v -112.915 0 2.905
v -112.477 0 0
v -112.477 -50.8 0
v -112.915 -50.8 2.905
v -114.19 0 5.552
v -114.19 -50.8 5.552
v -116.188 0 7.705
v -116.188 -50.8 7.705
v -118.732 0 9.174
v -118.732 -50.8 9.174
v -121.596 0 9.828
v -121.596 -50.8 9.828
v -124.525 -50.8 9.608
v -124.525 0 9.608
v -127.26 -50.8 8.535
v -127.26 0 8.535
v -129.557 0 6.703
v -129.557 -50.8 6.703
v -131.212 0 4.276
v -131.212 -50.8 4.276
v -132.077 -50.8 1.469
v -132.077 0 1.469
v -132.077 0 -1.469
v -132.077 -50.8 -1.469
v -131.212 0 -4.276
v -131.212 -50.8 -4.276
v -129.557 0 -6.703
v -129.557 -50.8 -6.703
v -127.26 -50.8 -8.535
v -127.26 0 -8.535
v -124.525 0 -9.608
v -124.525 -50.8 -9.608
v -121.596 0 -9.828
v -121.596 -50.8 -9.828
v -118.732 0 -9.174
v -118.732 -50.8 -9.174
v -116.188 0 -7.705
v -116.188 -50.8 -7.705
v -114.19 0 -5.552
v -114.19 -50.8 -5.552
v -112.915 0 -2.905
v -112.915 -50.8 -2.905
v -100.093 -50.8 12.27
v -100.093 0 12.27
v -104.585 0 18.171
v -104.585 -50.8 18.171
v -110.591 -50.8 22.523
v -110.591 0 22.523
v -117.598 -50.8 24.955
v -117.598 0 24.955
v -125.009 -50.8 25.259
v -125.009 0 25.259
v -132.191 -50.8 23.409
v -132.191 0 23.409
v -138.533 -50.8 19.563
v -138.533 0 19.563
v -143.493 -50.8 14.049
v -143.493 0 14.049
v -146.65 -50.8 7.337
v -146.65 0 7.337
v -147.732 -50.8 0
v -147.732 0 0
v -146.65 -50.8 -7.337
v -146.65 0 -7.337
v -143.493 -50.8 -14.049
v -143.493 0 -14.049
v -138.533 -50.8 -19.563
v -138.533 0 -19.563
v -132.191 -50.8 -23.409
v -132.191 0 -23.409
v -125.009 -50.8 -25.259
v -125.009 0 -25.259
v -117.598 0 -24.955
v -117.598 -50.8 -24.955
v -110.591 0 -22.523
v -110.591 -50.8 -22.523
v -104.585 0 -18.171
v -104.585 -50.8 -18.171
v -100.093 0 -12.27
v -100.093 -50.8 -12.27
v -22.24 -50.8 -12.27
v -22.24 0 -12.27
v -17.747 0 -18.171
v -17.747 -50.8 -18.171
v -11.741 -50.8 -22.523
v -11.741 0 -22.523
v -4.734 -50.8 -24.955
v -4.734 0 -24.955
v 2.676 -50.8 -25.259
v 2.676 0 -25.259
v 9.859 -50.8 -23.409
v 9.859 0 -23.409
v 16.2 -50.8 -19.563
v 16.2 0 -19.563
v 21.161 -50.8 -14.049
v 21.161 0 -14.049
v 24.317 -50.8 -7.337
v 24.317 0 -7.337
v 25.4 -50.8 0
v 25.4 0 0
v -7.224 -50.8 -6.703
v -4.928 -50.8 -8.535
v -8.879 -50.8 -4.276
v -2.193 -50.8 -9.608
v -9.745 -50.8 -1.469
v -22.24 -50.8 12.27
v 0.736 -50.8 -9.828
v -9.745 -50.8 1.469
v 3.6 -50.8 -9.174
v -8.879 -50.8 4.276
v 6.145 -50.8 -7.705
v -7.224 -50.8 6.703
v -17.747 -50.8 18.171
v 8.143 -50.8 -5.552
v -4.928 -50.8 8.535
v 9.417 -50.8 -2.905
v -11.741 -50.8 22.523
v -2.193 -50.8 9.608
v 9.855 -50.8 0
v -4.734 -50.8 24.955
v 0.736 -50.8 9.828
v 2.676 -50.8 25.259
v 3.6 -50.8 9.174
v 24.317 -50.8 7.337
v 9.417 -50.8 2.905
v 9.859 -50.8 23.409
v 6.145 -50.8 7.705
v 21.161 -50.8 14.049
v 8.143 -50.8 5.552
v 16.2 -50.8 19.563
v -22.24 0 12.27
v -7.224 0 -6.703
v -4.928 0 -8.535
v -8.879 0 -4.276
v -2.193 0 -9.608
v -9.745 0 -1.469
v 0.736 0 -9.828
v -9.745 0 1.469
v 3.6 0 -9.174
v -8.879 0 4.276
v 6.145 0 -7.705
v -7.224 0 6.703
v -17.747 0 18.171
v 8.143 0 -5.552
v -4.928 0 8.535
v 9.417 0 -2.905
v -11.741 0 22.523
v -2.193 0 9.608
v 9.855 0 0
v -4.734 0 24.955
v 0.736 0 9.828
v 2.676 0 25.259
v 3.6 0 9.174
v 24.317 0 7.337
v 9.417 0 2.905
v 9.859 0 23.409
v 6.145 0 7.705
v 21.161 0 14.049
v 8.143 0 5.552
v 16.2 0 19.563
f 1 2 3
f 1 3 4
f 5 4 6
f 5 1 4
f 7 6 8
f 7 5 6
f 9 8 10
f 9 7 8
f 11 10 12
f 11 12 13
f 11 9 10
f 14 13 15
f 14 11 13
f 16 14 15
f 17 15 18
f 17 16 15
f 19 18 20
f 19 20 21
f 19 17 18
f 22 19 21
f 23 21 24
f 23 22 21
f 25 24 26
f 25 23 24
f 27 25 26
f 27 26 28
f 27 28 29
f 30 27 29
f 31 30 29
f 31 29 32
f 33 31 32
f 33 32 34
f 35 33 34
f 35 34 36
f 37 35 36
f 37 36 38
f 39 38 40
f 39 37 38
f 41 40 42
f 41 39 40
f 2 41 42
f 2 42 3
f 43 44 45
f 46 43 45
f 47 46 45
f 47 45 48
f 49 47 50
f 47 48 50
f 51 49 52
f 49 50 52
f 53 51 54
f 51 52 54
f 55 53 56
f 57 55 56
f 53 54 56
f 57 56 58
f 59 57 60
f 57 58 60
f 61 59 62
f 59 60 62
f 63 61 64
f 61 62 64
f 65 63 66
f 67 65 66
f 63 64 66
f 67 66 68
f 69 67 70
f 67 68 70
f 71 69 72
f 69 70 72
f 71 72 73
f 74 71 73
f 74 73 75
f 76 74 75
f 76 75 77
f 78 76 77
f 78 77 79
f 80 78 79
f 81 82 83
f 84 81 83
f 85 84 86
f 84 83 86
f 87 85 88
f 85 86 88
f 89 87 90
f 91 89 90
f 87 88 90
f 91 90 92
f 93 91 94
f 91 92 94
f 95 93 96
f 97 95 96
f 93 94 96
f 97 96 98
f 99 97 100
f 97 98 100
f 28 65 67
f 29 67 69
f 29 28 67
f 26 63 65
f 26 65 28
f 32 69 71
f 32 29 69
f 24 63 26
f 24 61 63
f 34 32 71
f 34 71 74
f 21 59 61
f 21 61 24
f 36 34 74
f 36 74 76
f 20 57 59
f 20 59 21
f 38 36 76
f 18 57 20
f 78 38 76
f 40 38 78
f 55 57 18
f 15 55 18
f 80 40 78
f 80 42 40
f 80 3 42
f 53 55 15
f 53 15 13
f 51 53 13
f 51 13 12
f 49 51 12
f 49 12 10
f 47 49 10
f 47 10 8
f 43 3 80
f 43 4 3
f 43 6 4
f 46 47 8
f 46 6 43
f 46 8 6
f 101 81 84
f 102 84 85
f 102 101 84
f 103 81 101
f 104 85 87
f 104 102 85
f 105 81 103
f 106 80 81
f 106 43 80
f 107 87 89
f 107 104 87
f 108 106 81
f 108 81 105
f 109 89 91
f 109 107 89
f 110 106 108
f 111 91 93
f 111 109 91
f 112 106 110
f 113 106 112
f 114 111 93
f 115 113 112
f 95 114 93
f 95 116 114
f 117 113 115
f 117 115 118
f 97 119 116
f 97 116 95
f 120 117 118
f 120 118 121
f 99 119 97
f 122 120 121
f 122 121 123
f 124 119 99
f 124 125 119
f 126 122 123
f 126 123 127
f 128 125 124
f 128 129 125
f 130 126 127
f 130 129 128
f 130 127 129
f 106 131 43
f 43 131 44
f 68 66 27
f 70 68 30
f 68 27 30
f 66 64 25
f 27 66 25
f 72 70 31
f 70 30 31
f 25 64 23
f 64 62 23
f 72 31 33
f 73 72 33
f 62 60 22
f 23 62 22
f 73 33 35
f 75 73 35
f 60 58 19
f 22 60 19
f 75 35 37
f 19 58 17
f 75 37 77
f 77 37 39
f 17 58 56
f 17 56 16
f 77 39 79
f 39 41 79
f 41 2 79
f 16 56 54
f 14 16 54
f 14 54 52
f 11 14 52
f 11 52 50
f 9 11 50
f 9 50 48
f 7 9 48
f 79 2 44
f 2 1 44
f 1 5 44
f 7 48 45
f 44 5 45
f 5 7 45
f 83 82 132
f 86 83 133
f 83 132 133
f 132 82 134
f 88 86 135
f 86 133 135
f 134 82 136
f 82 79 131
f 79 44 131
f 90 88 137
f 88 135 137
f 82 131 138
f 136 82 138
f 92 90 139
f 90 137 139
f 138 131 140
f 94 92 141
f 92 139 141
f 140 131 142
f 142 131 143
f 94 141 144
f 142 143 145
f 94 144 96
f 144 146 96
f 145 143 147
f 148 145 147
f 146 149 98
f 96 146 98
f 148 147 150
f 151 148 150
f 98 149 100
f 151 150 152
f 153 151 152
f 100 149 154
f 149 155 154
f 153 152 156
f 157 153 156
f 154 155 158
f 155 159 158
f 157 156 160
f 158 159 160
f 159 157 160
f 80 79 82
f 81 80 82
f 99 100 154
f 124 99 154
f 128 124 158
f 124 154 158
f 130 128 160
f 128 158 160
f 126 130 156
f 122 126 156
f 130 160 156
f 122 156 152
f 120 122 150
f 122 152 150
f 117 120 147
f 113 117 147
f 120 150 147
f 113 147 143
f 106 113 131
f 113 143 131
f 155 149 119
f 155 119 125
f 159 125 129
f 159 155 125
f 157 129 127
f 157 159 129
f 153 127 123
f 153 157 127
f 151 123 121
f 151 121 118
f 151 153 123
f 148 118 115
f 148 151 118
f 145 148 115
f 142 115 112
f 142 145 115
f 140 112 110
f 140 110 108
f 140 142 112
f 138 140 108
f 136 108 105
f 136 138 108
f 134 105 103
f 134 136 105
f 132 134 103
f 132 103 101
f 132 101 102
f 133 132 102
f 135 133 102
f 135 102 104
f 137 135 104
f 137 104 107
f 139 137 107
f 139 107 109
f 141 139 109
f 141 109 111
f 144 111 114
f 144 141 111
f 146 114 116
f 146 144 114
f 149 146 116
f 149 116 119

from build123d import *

# Parameters (mm, degrees)
F0_R     = 9.855084
F1_DEPTH = 50.8


with BuildPart() as f1:
    # F0 (on Front) → F1 (new body)
    with BuildSketch(Plane.XZ):
        with BuildLine():
            ThreePointArc((-22.239753, -12.270021), (6.33523, -24.597253), (25.4, 0))
            ThreePointArc((25.4, 0), (6.33523, 24.597253), (-22.239753, 12.270021))
            ThreePointArc((-22.239753, 12.270021), (-25.4, 0), (-22.239753, -12.270021))
        make_face()
        Circle(F0_R, mode=Mode.SUBTRACT)
        with BuildLine():
            ThreePointArc((-96.932443, 0), (-97.73519, 6.33523), (-100.09269, 12.270021))
            ThreePointArc((-100.09269, 12.270021), (-147.732443, 0), (-100.09269, -12.270021))
            ThreePointArc((-100.09269, -12.270021), (-97.73519, -6.33523), (-96.932443, 0))
        make_face()
        with Locations((-122.332443, 0)):
            Circle(F0_R, mode=Mode.SUBTRACT)
        with BuildLine():
            ThreePointArc((-22.239753, -12.270021), (-25.4, 0), (-22.239753, 12.270021))
            Line((-22.239753, 12.270021), (-100.09269, 12.270021))
            ThreePointArc((-100.09269, 12.270021), (-97.73519, 6.33523), (-96.932443, 0))
            ThreePointArc((-96.932443, 0), (-97.73519, -6.33523), (-100.09269, -12.270021))
            Line((-100.09269, -12.270021), (-22.239753, -12.270021))
        make_face()
    extrude(amount=F1_DEPTH)


solid = f1.part
